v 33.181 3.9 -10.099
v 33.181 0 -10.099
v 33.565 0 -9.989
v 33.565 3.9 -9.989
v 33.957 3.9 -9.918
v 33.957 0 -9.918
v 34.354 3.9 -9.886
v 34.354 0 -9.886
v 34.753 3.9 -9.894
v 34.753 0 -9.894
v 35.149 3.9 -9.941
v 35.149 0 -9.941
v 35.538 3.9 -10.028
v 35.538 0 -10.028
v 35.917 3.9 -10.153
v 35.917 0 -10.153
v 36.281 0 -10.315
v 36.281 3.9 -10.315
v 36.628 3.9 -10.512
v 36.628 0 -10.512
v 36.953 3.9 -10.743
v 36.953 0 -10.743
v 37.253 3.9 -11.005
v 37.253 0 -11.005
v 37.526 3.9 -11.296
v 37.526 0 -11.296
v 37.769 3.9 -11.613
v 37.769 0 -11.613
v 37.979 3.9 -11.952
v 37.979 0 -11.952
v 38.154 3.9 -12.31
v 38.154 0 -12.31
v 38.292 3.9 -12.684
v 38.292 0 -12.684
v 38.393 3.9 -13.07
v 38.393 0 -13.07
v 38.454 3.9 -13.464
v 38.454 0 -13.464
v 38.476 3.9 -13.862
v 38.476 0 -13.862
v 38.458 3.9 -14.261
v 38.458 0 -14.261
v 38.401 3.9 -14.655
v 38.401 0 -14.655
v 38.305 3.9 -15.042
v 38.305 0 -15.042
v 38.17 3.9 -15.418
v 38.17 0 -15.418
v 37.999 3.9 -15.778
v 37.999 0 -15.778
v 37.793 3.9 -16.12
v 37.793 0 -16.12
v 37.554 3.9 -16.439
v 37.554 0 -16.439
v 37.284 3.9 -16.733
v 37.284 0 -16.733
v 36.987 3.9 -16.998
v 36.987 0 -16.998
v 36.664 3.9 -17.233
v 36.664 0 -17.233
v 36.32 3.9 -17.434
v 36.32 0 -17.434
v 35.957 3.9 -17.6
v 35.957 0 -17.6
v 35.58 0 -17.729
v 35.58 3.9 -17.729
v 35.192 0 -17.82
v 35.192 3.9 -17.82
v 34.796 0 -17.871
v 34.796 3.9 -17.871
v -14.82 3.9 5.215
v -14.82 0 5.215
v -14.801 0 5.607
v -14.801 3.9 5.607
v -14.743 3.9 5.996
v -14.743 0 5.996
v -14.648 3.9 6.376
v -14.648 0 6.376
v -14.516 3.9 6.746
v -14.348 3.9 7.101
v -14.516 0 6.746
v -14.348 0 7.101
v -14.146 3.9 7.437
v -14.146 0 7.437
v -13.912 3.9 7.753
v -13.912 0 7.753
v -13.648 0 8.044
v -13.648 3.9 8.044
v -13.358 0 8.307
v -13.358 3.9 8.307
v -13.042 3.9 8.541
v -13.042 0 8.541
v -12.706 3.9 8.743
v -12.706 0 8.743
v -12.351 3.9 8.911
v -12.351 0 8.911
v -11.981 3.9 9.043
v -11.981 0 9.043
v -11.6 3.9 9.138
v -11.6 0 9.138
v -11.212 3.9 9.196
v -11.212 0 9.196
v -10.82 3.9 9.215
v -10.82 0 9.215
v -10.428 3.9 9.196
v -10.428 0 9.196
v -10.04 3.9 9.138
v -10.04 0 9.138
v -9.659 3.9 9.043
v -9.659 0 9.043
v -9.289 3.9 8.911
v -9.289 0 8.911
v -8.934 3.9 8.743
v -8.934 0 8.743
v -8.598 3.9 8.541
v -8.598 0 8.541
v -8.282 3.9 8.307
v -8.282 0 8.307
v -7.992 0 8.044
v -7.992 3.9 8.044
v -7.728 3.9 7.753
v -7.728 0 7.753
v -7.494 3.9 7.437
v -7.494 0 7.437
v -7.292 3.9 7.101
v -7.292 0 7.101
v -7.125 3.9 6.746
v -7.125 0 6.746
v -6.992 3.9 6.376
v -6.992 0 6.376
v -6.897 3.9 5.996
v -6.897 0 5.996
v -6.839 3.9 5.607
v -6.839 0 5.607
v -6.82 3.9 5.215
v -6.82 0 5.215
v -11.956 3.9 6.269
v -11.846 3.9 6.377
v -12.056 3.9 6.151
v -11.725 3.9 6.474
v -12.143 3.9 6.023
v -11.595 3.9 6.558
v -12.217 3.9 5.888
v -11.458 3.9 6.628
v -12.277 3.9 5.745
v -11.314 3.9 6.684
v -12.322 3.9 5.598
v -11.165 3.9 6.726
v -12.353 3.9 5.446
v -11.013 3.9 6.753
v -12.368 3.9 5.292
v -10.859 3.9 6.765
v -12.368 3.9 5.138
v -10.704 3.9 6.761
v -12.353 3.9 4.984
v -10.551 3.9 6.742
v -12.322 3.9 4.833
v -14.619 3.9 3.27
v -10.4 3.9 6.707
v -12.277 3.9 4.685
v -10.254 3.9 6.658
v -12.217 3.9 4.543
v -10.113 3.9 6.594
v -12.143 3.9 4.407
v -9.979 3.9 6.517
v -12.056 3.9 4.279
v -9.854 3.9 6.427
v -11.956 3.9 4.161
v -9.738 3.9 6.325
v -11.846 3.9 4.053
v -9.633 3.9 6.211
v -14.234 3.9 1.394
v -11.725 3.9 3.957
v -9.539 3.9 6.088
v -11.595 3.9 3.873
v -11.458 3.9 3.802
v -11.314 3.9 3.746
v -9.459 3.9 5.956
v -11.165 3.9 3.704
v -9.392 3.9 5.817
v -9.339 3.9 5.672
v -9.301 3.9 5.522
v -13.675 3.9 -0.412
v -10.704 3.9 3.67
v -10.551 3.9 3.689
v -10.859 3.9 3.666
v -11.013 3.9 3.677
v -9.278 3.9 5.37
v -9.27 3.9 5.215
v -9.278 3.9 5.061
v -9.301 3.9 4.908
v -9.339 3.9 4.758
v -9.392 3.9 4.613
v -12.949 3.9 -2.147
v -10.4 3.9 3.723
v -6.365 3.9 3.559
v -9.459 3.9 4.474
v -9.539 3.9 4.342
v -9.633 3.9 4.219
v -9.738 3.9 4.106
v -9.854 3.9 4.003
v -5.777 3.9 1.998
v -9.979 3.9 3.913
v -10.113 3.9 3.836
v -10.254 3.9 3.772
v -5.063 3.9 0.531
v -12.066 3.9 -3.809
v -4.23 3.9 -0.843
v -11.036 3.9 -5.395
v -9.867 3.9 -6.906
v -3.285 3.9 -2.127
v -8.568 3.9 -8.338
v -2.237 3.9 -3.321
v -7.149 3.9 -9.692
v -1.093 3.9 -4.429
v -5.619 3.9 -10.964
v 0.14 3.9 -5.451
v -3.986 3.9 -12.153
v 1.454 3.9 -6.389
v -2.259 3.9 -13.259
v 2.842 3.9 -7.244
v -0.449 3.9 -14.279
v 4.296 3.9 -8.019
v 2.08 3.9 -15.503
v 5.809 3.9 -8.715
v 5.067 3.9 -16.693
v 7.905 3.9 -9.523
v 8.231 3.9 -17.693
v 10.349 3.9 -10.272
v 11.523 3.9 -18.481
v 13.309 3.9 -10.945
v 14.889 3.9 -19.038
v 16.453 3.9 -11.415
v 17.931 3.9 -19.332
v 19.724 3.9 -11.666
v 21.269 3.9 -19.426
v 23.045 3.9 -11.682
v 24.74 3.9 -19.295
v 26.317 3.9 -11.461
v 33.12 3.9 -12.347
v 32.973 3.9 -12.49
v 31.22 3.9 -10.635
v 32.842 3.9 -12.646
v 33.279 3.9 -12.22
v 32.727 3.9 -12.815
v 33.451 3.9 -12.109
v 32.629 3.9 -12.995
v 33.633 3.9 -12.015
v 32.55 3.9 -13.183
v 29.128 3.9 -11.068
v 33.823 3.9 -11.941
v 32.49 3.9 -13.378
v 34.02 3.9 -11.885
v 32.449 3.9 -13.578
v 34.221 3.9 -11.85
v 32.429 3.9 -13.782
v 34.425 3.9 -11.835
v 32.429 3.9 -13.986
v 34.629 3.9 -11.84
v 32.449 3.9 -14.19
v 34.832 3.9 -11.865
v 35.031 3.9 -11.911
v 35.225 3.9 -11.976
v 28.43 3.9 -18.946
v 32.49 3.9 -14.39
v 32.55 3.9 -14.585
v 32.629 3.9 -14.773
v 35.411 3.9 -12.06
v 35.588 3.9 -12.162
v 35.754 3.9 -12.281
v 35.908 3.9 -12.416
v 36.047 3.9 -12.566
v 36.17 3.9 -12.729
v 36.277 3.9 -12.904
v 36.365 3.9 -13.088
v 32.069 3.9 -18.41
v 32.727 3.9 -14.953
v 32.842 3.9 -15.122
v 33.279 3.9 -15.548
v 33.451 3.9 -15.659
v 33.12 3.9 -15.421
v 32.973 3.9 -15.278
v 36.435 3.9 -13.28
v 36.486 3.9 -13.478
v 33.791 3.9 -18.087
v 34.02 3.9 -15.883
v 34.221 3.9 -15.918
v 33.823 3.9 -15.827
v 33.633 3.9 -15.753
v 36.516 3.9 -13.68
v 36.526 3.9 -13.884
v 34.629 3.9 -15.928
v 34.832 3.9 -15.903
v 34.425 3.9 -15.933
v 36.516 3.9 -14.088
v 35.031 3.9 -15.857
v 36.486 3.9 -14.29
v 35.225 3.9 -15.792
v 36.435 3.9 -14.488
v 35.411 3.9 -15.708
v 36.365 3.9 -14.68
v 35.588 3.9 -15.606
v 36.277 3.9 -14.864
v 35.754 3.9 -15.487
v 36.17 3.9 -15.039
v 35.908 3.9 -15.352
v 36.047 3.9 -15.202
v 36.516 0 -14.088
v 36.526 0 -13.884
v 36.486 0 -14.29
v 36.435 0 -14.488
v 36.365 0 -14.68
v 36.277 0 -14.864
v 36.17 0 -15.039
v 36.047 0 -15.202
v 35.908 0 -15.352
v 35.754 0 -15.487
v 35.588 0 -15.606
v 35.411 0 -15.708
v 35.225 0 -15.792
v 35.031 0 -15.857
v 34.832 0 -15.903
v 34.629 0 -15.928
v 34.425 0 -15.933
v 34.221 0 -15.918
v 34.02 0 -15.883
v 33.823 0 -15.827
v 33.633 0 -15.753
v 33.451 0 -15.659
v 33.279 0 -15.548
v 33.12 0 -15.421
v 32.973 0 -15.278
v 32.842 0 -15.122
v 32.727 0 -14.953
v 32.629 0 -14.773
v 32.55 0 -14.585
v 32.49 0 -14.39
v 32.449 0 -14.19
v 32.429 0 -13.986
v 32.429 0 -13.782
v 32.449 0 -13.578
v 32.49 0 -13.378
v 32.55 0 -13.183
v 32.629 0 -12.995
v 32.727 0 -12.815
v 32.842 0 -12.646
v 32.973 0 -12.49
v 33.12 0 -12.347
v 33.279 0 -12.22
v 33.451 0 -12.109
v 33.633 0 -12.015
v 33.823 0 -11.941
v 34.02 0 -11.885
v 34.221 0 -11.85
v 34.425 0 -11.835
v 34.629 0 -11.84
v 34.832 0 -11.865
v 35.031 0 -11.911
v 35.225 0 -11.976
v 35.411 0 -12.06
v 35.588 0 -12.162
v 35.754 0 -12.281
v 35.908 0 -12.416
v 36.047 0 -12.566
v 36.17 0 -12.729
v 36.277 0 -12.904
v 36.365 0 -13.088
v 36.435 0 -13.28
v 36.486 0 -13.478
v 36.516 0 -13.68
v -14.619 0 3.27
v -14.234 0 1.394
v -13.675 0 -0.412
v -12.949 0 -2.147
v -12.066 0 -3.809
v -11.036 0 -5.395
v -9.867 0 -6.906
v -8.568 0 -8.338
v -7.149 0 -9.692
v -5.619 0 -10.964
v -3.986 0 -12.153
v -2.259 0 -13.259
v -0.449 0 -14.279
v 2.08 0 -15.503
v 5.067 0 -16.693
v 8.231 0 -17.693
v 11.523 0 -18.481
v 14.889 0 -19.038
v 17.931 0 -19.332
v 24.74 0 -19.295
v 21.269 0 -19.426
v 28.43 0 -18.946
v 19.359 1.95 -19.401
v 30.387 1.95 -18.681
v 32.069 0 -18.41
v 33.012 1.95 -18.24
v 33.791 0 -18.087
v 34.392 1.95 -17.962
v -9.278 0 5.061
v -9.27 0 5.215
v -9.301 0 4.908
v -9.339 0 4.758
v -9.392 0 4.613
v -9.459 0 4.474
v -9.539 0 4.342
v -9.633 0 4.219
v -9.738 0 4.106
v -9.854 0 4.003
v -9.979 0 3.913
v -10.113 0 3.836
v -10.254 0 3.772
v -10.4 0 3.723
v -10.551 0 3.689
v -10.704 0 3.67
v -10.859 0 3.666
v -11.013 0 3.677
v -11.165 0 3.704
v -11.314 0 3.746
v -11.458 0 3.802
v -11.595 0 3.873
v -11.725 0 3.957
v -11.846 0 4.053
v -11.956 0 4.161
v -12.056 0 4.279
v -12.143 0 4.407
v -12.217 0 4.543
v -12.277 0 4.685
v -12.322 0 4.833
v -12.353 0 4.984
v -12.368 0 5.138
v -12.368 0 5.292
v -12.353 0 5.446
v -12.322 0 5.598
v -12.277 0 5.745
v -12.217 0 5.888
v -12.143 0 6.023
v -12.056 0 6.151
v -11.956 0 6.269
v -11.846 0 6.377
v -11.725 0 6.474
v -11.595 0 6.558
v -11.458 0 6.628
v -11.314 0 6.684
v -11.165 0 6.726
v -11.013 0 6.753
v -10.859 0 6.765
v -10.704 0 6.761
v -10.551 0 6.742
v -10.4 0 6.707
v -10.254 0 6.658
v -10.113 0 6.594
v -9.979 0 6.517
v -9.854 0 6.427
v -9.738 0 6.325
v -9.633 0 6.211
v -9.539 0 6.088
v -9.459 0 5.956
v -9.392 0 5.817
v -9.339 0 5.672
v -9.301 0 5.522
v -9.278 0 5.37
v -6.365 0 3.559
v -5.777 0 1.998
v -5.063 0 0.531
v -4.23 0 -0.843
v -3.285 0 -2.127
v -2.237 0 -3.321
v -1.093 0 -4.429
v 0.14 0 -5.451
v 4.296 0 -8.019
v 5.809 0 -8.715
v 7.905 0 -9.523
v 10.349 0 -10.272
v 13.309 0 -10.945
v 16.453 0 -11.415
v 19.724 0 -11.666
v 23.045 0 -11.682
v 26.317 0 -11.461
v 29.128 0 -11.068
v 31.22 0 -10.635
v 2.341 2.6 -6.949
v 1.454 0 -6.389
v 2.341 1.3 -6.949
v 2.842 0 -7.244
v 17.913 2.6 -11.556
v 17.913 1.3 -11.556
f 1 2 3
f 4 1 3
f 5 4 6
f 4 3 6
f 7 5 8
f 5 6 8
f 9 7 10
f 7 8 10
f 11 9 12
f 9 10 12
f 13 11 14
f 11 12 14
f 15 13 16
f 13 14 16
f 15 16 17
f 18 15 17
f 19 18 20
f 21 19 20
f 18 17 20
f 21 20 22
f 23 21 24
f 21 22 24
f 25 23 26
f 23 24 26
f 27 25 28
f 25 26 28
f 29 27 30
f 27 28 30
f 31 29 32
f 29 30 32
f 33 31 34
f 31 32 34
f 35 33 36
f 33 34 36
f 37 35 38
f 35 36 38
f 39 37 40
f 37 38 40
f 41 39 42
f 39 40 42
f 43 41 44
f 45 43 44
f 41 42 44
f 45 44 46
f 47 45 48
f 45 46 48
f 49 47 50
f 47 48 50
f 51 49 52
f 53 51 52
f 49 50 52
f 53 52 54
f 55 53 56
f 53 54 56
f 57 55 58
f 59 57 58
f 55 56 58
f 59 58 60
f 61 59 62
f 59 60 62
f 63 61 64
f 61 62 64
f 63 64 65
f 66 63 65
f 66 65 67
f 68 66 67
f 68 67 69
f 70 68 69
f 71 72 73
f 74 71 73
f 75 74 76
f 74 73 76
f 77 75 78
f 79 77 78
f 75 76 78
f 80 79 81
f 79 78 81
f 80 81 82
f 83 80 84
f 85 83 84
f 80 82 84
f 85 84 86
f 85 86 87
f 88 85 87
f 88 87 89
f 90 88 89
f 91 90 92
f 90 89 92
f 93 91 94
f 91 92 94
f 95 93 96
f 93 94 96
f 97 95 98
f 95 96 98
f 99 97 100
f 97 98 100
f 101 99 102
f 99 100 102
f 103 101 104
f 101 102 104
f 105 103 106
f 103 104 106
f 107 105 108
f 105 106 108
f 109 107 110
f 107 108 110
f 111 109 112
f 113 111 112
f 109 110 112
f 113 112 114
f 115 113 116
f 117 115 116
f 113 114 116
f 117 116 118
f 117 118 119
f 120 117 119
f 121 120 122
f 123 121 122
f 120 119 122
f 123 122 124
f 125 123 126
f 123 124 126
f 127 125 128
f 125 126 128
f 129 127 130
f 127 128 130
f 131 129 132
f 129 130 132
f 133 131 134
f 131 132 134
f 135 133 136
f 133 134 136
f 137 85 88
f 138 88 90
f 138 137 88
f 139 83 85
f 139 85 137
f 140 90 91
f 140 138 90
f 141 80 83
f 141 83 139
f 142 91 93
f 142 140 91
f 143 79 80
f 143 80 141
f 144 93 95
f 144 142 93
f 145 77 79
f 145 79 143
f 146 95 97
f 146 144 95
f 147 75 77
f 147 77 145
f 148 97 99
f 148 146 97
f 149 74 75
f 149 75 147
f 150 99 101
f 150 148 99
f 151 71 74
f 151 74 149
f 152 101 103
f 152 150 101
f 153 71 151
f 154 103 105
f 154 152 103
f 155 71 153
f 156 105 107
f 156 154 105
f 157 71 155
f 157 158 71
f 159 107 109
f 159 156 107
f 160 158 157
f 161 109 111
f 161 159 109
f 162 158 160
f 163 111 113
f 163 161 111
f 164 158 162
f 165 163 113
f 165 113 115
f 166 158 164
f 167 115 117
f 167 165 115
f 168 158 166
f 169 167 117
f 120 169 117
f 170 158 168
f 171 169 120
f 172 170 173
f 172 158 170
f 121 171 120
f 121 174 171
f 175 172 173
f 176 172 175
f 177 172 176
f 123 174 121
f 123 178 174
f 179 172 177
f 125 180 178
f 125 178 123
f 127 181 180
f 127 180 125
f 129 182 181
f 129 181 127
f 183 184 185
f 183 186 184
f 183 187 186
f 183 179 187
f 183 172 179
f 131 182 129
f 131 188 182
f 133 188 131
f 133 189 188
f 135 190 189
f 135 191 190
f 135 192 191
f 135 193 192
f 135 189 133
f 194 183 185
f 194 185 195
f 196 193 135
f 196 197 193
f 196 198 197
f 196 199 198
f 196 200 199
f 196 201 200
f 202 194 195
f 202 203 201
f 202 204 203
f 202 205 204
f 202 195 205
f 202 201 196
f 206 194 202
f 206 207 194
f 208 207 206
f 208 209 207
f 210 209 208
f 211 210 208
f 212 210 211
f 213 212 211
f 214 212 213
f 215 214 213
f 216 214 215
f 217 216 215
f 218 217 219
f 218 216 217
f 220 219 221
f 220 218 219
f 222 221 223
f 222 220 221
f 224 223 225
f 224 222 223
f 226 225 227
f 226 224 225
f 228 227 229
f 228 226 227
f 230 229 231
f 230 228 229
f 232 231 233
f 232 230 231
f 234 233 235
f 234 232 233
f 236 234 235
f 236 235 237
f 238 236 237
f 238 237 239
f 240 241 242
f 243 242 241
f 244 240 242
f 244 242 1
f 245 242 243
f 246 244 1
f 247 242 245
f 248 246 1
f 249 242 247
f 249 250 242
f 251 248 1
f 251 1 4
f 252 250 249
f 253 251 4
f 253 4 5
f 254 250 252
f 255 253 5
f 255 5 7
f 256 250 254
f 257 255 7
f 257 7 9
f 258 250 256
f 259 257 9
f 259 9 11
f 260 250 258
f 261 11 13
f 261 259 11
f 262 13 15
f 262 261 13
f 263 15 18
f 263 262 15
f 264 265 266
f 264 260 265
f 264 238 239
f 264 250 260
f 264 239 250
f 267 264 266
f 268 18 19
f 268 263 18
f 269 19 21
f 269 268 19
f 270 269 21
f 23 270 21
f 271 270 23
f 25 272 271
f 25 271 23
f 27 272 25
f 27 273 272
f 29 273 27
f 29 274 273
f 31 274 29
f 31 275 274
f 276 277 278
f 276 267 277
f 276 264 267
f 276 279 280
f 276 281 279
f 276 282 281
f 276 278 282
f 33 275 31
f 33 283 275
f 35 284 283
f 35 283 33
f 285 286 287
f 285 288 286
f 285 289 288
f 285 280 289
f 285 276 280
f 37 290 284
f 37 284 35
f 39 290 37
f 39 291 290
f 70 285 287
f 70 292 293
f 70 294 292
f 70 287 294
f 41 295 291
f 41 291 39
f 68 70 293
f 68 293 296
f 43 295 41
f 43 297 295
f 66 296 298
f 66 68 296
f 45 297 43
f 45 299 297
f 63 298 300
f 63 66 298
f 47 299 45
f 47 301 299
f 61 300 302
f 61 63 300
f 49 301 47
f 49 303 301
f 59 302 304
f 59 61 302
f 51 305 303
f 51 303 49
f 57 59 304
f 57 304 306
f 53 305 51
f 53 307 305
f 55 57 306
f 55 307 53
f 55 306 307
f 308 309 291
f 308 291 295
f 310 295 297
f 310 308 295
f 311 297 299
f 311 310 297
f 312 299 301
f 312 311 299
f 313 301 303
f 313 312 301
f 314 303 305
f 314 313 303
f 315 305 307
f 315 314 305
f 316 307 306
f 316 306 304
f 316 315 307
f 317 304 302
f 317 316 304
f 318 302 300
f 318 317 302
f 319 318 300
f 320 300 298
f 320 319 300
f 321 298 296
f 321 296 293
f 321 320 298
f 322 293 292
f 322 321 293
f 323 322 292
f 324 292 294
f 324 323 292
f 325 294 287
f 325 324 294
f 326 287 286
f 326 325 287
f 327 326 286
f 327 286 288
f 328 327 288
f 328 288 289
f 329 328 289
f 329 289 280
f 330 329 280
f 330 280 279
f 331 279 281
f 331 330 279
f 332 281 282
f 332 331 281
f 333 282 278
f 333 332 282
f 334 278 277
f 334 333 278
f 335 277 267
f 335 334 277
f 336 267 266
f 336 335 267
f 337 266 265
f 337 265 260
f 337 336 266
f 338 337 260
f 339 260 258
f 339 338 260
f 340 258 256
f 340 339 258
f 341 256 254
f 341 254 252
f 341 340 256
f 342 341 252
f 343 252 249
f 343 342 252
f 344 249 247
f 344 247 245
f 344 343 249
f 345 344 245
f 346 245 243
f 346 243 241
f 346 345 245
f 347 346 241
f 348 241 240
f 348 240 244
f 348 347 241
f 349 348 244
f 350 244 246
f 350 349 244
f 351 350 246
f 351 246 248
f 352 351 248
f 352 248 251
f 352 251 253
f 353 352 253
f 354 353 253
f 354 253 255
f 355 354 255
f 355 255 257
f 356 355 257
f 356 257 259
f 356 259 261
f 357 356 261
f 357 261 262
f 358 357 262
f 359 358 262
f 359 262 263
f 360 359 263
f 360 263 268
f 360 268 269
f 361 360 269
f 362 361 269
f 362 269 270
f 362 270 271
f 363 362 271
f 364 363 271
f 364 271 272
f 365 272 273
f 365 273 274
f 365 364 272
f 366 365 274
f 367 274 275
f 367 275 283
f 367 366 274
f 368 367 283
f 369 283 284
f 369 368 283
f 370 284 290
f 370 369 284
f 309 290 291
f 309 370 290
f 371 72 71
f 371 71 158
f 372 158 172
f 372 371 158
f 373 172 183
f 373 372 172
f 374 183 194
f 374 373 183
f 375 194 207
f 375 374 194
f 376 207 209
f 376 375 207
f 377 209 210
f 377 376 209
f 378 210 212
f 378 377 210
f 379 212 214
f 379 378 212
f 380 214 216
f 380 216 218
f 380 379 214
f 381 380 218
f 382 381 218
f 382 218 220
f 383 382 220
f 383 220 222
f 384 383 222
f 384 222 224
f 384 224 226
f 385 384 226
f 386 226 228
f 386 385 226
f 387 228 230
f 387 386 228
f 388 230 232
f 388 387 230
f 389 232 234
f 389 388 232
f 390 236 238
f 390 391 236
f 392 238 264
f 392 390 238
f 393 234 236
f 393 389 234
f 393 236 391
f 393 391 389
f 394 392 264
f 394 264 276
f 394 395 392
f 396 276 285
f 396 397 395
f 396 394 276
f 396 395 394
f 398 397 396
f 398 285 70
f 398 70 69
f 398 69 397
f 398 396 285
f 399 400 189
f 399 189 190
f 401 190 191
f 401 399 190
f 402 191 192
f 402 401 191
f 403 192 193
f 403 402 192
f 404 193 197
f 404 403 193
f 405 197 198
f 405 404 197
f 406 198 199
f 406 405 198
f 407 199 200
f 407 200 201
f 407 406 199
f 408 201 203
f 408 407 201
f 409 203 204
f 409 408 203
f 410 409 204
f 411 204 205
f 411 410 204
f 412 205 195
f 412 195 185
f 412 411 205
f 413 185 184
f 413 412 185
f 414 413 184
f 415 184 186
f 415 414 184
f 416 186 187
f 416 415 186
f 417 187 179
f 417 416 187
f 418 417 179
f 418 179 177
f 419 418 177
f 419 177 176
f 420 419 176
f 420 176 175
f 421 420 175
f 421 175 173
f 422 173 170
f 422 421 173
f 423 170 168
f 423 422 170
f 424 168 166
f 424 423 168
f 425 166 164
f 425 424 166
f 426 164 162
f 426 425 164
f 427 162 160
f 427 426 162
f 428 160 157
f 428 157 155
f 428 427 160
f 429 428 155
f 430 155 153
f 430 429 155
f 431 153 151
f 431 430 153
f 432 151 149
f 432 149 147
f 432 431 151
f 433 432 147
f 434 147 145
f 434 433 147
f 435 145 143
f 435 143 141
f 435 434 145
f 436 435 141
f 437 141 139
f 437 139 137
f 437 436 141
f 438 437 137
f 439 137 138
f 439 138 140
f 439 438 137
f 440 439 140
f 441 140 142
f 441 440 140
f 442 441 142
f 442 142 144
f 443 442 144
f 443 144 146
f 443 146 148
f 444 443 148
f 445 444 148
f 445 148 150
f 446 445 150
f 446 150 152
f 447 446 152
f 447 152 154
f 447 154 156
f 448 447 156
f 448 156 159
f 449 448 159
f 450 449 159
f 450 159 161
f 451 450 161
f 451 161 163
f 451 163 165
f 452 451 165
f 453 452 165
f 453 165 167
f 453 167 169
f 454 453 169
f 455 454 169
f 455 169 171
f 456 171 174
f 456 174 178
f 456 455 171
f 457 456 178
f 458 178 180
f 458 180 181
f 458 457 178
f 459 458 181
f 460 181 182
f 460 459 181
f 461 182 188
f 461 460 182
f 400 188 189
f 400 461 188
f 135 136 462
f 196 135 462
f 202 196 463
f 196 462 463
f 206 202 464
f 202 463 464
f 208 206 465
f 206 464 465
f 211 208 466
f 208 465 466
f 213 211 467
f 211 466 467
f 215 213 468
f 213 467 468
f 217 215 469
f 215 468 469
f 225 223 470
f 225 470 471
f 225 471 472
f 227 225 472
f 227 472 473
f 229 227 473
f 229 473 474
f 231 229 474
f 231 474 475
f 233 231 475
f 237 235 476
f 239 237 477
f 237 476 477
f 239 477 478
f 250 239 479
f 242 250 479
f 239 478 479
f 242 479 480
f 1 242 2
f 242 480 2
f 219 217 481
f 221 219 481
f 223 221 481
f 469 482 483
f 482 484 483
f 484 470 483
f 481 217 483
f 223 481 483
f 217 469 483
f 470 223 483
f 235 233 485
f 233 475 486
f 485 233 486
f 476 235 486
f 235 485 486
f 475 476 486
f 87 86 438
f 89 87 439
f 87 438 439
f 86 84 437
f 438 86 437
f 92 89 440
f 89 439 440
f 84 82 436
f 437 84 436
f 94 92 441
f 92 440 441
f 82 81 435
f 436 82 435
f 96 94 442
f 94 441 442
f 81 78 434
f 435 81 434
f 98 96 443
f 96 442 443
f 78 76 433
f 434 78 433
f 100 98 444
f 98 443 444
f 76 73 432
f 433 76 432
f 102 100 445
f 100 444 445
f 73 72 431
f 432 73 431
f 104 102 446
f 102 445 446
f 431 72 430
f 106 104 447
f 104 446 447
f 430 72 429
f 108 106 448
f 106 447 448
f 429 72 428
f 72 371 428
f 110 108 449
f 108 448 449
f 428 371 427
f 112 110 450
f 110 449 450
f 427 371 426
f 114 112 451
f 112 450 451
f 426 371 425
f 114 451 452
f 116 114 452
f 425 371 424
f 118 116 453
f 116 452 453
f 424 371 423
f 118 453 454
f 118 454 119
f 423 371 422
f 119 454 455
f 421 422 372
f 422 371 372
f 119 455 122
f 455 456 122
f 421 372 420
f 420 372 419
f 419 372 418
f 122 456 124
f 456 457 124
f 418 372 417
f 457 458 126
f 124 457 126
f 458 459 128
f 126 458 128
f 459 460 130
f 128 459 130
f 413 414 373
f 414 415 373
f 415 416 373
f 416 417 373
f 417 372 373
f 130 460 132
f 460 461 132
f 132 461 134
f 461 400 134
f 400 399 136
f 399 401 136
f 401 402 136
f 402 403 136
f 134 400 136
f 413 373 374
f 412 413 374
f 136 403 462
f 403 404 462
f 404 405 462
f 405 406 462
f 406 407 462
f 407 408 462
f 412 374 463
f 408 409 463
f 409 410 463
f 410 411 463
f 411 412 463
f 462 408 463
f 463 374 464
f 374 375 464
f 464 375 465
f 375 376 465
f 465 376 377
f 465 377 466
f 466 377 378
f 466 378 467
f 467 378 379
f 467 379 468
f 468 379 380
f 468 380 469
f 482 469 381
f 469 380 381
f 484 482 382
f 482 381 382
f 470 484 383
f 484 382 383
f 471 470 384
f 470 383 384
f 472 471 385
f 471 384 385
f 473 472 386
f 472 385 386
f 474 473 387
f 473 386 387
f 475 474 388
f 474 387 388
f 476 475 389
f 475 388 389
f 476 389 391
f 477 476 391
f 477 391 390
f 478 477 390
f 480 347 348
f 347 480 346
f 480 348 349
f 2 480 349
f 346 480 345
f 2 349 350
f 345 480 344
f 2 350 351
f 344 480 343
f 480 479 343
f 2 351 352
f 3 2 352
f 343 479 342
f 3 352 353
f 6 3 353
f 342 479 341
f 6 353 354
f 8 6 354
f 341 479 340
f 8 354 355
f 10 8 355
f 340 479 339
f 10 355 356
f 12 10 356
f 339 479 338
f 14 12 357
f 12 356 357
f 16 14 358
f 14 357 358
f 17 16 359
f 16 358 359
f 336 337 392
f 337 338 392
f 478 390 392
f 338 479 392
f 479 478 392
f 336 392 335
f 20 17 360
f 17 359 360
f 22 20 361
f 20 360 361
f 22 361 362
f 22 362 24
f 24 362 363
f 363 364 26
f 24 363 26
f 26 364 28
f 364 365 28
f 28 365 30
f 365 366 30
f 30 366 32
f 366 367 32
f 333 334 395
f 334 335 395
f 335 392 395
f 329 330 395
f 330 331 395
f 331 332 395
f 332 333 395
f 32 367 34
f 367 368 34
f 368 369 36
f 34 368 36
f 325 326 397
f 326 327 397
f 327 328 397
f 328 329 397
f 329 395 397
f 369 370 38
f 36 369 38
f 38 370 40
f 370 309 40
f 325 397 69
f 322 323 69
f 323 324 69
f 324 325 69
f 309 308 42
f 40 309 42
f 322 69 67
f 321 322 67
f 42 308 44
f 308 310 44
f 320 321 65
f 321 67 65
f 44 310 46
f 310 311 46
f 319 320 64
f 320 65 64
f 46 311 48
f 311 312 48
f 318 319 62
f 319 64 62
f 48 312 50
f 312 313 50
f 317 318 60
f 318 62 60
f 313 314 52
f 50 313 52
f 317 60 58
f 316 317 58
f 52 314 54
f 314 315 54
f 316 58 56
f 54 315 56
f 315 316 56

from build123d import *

# Parameters (mm, degrees)
SKETCH1_R           = 1.55
SKETCH1_R_2         = 2.05
BOSS_EXTRUDE1_DEPTH = 3.9


with BuildPart() as part:
    # Sketch1 → Boss-Extrude1 (new body)
    with BuildSketch(Plane(origin=(0, 0, 0), x_dir=(1, 0, 0), z_dir=(0, 1, 0))):
        with BuildLine():
            ThreePointArc((-14.820025451, -5.215177733), (-10.820025451, -9.215177733), (-6.820025451, -5.215177733))
            add(Edge.make_bspline(
                [(-6.820025451, -5.215177733), (-3.10433649, 11.226211993), (20.304386061, 14.090059899), (33.181268574, 10.099401317)],
                knots=[0, 0, 0, 0, 1, 1, 1, 1], degree=3))
            ThreePointArc((33.181268574, 10.099401317), (38.392505906, 13.07023944), (34.796153323, 17.871189532))
            add(Edge.make_bspline(
                [(-14.820025451, -5.215177733), (-14.024891934, 9.668323316), (10.780534752, 22.947844535), (33.5182405, 18.169051386), (34.796153323, 17.871189532)],
                knots=[0, 0, 0, 0, 0.692921381, 1, 1, 1, 1], degree=3))
        make_face()
        with Locations((-10.820025451, -5.215177733)):
            Circle(SKETCH1_R, mode=Mode.SUBTRACT)
        with Locations((34.476158372, 13.884009673)):
            Circle(SKETCH1_R_2, mode=Mode.SUBTRACT)
    extrude(amount=BOSS_EXTRUDE1_DEPTH)


solid = part.part
